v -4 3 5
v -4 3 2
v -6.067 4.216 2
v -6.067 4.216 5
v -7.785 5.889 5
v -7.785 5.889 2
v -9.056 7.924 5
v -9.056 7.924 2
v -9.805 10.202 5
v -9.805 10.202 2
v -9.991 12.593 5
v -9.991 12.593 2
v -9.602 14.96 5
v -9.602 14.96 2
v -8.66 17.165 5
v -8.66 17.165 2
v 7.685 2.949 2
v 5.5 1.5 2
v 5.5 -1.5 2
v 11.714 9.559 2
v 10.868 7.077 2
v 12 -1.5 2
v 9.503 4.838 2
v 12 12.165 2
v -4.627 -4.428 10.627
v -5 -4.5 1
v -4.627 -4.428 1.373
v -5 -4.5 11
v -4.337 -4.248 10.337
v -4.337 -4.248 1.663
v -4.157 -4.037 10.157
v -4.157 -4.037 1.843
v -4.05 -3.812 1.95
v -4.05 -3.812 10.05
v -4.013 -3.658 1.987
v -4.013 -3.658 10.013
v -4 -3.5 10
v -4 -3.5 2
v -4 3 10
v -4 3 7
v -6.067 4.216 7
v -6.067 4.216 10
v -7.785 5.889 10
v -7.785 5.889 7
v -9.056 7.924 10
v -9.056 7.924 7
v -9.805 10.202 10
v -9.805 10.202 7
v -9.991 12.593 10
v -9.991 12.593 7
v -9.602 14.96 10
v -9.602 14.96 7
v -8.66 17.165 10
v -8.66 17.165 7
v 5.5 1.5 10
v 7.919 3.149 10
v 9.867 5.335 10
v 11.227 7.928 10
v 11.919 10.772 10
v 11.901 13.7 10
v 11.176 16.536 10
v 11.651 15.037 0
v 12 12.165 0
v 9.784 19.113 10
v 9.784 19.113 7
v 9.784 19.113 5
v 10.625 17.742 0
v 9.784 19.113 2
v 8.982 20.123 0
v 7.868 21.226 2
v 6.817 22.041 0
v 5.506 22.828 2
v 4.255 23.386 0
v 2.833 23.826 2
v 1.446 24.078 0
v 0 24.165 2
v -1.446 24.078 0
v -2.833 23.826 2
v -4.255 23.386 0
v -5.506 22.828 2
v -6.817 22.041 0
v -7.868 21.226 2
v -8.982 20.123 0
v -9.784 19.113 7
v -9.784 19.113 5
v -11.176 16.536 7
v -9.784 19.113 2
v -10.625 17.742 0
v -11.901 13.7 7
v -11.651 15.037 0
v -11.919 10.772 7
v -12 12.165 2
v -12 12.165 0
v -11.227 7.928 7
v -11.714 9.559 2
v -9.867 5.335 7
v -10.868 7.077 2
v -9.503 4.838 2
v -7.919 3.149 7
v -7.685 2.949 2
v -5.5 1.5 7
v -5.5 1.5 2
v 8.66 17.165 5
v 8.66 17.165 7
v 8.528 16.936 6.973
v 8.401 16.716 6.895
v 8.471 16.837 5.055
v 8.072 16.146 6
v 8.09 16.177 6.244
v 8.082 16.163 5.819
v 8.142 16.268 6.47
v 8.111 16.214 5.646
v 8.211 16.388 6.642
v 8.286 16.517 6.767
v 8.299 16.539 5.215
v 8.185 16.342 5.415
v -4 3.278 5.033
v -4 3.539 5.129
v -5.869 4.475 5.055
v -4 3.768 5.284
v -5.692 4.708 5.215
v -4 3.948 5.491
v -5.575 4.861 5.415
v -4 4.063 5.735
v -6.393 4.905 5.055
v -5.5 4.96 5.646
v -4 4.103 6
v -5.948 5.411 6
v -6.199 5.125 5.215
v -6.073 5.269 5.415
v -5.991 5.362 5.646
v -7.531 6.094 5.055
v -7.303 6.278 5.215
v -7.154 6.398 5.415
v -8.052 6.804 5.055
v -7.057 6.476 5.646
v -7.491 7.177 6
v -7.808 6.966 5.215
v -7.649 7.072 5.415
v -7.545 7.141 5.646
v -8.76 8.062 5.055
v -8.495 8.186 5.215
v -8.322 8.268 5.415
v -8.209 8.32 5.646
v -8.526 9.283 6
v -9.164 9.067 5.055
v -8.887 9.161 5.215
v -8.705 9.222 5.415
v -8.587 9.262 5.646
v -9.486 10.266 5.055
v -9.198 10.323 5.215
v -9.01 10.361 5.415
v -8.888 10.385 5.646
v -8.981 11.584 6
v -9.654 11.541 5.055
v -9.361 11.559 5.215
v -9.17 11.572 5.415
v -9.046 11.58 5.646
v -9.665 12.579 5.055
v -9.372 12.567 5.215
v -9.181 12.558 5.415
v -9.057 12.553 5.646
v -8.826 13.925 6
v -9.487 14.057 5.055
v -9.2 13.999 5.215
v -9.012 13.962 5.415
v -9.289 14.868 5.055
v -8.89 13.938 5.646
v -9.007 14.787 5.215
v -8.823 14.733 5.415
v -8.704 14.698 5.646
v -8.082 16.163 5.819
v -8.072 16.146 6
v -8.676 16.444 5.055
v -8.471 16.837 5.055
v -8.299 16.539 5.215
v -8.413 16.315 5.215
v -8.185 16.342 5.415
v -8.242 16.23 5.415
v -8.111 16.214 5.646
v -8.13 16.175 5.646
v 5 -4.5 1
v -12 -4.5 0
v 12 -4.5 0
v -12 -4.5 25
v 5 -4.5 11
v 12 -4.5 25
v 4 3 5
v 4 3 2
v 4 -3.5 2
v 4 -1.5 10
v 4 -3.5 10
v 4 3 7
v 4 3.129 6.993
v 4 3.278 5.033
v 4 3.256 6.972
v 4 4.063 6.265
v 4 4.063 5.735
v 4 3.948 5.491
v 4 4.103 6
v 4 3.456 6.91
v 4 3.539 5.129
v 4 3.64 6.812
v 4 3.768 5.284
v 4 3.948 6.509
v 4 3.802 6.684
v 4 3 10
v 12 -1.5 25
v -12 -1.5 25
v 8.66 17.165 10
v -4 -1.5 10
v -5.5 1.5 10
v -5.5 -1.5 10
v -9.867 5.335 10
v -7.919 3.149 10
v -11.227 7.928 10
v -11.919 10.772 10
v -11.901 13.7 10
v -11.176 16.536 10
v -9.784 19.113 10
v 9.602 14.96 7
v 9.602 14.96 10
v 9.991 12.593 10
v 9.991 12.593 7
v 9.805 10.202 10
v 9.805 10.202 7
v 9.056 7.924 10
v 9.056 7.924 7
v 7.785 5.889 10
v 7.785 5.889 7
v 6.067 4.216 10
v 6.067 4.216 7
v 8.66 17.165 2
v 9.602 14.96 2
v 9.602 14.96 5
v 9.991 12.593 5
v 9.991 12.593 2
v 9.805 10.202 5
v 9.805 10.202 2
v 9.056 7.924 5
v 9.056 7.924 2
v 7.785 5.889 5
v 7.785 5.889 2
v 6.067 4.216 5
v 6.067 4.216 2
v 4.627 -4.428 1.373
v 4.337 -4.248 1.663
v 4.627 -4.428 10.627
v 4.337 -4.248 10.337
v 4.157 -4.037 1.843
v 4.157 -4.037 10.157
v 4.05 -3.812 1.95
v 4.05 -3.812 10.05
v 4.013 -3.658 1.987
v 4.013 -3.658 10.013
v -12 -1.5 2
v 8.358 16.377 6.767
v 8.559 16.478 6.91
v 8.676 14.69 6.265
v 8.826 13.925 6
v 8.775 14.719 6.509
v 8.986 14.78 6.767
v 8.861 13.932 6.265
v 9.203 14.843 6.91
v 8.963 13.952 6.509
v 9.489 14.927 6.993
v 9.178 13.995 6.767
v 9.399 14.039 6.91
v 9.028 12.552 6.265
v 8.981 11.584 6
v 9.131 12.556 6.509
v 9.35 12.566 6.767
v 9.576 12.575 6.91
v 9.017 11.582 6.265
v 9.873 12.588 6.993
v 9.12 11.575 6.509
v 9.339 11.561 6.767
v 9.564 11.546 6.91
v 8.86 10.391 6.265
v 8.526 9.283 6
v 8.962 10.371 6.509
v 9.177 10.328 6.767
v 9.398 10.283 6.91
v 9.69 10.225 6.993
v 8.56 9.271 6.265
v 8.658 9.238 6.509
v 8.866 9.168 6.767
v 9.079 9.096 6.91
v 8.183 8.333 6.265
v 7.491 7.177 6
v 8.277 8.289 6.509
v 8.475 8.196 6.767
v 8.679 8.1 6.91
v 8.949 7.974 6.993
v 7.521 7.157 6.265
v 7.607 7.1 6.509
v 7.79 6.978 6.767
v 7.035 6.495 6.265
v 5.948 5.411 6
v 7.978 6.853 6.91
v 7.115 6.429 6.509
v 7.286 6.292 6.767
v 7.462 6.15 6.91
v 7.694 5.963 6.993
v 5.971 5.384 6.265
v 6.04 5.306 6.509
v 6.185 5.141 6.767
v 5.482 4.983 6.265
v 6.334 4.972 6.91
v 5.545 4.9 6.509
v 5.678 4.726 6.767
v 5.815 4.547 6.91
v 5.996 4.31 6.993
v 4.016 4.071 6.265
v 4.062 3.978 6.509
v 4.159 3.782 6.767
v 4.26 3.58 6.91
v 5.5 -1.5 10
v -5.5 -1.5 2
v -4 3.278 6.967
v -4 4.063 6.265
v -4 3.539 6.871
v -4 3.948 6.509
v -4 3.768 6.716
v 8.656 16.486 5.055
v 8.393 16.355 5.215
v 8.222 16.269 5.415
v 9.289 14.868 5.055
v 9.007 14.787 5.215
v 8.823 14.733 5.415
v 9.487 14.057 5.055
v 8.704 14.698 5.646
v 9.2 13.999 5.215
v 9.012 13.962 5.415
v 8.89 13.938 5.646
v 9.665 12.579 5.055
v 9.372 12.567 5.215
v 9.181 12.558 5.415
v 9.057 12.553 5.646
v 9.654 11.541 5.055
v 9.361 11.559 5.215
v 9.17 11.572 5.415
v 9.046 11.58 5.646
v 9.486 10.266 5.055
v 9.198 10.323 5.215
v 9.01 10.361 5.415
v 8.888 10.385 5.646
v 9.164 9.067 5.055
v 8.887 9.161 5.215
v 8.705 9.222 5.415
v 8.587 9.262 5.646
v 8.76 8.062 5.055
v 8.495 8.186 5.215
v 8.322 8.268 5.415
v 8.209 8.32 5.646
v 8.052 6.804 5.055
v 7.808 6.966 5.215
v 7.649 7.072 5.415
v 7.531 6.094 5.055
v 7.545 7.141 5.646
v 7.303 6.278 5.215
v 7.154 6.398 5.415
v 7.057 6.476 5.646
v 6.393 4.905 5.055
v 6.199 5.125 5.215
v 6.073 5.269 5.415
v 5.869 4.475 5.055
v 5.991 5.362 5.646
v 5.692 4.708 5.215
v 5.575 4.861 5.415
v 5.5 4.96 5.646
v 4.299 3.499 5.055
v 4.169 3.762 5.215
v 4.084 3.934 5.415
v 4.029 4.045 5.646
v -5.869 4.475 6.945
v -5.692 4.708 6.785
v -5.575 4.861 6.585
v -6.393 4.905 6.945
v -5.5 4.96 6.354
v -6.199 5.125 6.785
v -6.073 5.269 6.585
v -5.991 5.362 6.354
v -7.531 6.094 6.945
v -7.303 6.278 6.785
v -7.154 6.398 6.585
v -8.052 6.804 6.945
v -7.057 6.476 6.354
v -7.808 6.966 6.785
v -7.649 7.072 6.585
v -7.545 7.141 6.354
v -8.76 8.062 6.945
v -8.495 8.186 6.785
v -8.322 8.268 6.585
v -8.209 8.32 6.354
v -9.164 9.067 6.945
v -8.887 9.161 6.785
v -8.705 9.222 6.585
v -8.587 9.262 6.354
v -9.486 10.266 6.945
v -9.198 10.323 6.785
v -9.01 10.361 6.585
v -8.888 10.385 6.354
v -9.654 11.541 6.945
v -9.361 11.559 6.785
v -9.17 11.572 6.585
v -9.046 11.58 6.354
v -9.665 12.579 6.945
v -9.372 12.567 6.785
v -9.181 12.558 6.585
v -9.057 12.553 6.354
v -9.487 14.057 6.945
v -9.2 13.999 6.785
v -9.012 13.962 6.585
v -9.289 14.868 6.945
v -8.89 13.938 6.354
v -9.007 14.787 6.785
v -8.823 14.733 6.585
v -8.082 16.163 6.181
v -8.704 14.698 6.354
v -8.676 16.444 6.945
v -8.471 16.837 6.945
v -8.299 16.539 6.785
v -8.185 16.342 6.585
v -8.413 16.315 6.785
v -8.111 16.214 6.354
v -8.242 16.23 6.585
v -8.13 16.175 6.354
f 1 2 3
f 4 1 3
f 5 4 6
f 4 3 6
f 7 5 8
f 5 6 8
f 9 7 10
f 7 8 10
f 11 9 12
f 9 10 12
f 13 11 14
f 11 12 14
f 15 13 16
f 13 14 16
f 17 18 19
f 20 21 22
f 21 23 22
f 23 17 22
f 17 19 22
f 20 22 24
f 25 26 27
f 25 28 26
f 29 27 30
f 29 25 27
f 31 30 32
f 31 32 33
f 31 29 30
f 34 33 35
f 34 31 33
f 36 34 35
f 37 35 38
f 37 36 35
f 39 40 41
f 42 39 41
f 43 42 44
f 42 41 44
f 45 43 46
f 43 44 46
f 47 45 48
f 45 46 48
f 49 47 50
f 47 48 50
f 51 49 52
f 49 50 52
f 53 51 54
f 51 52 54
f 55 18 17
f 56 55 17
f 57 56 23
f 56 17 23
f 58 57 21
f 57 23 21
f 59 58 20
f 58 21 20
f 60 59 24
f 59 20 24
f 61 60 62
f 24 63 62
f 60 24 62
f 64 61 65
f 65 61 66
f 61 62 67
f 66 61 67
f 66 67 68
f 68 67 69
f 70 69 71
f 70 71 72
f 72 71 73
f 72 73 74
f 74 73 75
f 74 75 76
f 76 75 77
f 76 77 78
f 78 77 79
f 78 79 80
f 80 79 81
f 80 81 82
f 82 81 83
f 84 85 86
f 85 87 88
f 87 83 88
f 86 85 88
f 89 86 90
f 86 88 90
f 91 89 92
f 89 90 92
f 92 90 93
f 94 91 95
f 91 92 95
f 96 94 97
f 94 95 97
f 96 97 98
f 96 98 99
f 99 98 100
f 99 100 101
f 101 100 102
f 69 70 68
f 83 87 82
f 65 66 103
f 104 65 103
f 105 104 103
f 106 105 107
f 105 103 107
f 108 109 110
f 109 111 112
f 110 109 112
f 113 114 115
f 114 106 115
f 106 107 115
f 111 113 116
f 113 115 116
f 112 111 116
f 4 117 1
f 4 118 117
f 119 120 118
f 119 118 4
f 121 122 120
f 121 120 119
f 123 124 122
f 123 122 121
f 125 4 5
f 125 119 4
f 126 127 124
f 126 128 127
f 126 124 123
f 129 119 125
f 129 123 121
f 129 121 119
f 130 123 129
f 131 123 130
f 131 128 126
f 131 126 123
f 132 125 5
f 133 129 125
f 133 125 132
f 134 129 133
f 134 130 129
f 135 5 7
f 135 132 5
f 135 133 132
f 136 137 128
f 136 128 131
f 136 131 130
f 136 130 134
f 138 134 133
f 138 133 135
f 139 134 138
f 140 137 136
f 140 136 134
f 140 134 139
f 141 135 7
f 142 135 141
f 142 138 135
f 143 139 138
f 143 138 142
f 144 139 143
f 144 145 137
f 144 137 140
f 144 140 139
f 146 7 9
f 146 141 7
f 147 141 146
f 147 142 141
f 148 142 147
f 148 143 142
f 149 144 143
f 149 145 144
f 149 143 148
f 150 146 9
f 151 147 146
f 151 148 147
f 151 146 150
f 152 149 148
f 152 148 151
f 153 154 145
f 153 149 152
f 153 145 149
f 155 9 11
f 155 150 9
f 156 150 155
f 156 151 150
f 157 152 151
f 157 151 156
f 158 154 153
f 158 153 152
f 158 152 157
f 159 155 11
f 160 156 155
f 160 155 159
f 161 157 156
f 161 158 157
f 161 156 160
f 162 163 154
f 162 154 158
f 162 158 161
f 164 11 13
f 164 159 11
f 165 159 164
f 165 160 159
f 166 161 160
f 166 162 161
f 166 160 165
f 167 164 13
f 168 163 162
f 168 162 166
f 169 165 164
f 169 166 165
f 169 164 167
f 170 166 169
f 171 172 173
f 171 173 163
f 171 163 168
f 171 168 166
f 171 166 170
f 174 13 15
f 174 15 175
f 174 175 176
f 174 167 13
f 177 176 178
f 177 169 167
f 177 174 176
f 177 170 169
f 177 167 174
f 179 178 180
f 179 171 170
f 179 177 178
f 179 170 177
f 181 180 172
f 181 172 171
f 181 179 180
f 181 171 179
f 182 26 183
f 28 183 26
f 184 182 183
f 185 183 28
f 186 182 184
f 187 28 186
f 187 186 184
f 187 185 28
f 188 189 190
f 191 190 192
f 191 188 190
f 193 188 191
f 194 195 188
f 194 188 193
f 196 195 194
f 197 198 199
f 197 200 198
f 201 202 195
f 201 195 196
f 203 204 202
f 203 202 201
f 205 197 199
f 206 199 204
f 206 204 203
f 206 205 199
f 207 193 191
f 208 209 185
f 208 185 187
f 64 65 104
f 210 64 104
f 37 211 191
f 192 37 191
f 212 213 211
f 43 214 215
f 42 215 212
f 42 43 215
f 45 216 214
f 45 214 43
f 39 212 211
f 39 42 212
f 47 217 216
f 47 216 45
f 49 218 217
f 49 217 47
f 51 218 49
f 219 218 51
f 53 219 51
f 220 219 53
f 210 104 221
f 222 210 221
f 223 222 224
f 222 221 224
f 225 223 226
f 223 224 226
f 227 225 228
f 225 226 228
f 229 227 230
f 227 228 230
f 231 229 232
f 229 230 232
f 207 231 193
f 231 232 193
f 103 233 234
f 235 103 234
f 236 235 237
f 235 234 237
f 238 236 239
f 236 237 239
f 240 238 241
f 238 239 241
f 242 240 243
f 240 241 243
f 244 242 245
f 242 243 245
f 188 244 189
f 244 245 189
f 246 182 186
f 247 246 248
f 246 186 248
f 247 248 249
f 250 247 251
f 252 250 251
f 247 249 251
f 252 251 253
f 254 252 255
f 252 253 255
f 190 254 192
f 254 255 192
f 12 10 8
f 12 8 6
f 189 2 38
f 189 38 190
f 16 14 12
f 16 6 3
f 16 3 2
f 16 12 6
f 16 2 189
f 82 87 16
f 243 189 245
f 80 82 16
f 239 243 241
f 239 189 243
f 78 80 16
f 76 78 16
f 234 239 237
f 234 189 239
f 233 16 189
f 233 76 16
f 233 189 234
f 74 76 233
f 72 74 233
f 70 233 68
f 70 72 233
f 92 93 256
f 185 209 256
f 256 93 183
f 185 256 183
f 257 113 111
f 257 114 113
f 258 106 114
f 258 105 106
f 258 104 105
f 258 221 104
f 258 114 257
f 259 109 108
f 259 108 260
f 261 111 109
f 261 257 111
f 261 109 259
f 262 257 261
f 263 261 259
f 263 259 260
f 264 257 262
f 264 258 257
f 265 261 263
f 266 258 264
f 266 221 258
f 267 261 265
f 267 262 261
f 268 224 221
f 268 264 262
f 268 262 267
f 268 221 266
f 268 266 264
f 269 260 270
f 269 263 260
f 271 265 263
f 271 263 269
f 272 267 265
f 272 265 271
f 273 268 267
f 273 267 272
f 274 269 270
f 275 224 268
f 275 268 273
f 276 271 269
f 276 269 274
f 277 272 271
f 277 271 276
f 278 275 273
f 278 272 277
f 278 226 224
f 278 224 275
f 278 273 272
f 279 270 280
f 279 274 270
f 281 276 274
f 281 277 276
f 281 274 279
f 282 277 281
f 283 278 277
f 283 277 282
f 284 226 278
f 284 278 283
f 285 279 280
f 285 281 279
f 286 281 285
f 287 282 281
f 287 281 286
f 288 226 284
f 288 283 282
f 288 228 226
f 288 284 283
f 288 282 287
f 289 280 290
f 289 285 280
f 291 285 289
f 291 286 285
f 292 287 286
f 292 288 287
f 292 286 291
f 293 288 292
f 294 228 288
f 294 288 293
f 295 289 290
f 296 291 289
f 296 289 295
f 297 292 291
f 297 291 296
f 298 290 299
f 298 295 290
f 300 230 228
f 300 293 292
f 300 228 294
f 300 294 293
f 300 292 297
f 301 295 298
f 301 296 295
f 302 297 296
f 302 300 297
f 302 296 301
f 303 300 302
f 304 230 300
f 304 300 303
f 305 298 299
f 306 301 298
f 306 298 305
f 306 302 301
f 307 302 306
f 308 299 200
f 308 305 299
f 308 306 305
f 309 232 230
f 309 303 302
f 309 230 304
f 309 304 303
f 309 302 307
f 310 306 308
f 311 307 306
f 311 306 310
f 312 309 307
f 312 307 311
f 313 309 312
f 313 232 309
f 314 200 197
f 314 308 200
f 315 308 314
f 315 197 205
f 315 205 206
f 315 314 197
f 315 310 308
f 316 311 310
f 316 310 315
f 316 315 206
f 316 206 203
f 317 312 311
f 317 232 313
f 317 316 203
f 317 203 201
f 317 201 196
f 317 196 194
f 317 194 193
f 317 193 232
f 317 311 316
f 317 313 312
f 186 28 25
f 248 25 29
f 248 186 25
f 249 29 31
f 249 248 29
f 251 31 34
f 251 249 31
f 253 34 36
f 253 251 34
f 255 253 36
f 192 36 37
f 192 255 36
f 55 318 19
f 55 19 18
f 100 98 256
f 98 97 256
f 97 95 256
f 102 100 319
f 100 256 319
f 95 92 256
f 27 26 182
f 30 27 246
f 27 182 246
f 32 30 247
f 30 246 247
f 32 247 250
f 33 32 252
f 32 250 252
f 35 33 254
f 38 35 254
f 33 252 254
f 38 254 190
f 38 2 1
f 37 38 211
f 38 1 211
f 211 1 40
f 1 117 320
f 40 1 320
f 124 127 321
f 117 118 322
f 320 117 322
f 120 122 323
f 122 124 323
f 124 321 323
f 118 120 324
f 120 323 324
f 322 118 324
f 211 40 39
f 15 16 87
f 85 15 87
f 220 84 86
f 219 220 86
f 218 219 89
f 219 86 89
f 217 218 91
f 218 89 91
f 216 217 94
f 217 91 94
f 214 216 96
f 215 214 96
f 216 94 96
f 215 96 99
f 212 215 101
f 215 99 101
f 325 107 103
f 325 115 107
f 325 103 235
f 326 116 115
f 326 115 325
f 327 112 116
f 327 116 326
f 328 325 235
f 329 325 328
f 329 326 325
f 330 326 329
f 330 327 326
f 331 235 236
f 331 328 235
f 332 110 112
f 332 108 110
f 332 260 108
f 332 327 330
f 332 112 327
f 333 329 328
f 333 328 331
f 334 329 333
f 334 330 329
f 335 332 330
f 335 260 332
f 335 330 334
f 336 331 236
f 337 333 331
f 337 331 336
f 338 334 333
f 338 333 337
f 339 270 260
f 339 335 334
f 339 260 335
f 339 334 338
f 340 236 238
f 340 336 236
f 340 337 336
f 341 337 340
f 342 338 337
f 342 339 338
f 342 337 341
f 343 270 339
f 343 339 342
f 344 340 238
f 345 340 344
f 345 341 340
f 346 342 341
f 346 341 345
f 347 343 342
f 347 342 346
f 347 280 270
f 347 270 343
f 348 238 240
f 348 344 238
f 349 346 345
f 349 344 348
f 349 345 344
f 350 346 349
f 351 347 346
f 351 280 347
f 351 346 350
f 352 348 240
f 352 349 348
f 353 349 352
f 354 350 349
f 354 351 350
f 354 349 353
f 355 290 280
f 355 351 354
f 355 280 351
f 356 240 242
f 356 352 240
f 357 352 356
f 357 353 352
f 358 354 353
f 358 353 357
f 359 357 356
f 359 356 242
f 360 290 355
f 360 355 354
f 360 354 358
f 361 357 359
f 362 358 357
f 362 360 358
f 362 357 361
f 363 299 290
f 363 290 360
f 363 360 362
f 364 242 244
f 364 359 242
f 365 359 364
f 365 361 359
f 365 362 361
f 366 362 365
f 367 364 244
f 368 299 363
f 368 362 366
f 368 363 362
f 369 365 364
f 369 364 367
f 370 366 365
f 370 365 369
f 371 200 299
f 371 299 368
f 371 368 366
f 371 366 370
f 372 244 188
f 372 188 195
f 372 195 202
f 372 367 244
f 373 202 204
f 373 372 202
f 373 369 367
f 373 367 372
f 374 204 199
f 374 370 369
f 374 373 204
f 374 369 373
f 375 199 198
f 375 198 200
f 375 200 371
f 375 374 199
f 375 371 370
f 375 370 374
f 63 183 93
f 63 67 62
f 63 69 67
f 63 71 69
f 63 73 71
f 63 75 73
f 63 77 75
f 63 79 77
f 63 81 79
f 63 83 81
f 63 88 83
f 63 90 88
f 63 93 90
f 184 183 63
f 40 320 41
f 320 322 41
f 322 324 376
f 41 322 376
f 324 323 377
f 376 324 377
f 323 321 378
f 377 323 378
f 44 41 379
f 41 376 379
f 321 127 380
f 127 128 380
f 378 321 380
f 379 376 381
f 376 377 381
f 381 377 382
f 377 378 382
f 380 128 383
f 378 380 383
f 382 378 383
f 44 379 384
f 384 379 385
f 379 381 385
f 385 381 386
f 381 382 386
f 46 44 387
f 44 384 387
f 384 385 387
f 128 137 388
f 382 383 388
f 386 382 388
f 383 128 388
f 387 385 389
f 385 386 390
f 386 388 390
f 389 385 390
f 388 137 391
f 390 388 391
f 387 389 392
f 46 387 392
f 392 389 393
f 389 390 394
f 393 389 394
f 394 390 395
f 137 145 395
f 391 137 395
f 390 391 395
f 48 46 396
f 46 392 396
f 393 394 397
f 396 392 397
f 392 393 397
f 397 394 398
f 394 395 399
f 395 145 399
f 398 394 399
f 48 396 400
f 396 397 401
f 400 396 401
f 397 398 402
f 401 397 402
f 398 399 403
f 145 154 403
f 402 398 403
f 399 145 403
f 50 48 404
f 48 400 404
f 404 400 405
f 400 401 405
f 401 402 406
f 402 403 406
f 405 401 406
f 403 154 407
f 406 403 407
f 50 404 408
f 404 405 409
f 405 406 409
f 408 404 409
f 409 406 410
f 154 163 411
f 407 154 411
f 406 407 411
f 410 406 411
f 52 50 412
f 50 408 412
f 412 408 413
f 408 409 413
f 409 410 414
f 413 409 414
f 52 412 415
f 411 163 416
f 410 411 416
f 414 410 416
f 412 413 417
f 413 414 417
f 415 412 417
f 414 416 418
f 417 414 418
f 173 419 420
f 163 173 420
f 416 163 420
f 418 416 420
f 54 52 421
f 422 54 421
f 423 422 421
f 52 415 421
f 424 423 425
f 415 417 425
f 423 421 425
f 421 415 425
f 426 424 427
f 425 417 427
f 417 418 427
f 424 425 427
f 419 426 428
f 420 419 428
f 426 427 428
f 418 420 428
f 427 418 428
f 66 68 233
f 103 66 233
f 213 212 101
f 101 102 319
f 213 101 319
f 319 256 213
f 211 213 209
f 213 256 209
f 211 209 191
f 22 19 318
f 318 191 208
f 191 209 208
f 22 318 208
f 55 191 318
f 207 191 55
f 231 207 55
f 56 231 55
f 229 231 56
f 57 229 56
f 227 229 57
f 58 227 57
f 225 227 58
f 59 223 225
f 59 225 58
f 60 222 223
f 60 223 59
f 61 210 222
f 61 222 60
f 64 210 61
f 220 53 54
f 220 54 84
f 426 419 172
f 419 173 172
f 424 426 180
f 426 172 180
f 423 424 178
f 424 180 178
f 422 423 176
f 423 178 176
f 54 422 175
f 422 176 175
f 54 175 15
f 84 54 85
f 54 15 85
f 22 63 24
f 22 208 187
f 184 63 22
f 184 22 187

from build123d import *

# Parameters (mm, degrees)
F1_DEPTH  = 2
F3_DEPTH  = 3
F5_DEPTH  = 2
F7_DEPTH  = 3
F8_R      = 0.99999
F9_W      = 24
F9_H      = 22.6653645039
F10_DEPTH = 10
F11_W     = 24
F11_H     = 25
F11_W_2   = 8
F11_H_2   = 8
F12_DEPTH = 3
F13_R     = 1
F14_W     = 24
F14_H     = 13.6653645039
F15_DEPTH = 2


# Not quite as in the source:
# - a fillet or chamfer is up to 0.001 mm smaller than in the source, because OpenCascade refuses the exact size


with BuildPart() as f1:
    # F0 (on Top) → F1 (new body)
    with BuildSketch(Plane.XY):
        with BuildLine():
            ThreePointArc((5.5, 1.5), (0, 24.1653645039), (-5.5, 1.5))
            Line((-5.5, 1.5), (-5.5, -1.5))
            ThreePointArc((-5.5, -1.5), (0, -24.1653645039), (5.5, -1.5))
            Line((5.5, -1.5), (5.5, 1.5))
        make_face()
    extrude(amount=F1_DEPTH)

    # F2 (on face) → F3 (join)
    with BuildSketch(Plane.XY.offset(2)):
        with BuildLine():
            Line((9.7844830762, 19.1125863177), (8.6602540378, 17.1653645039))
            ThreePointArc((8.6602540378, 17.1653645039), (9.4991255677, 9.0402063559), (4, 3.0002131139))
            Line((4, 3.0002131139), (4, -6.2432010007))
            Line((4, -6.2432010007), (9.1651513899, -16.1653645039))
            ThreePointArc((9.1651513899, -16.1653645039), (9.5868378212, -9.3206253964), (5.5, -3.8137179596))
            Line((5.5, -3.8137179596), (5.5, 1.5))
            ThreePointArc((5.5, 1.5), (11.6599594736, 9.3289327537), (9.7844830762, 19.1125863177))
        make_face()
        with BuildLine():
            ThreePointArc((-4, 3.0002131139), (-9.4991255677, 9.0402063559), (-8.6602540378, 17.1653645039))
            Line((-8.6602540378, 17.1653645039), (-9.7844830762, 19.1125863177))
            ThreePointArc((-9.7844830762, 19.1125863177), (-11.6599594736, 9.3289327537), (-5.5, 1.5))
            Line((-5.5, 1.5), (-5.5, -3.8137179596))
            ThreePointArc((-5.5, -3.8137179596), (-9.5868378212, -9.3206253964), (-9.1651513899, -16.1653645039))
            Line((-9.1651513899, -16.1653645039), (-4, -6.2432010007))
            Line((-4, -6.2432010007), (-4, 3.0002131139))
        make_face()
    extrude(amount=F3_DEPTH)

    # F4 (on face) → F5 (join)
    with BuildSketch(Plane.XY.offset(5)):
        with BuildLine():
            Line((-8.0717844057, 16.1461052023), (-9.7844830762, 19.1125863177))
            ThreePointArc((-9.7844830762, 19.1125863177), (-11.6599594736, 9.3289327537), (-5.5, 1.5))
            Line((-5.5, 1.5), (-5.5, -5.0414610795))
            ThreePointArc((-5.5, -5.0414610795), (-8.6043935433, -9.5263473097), (-8.5483759414, -14.980549891))
            Line((-8.5483759414, -14.980549891), (-4, -6.2432010007))
            Line((-4, -6.2432010007), (-4, 4.1031067556))
            ThreePointArc((-4, 4.1031067556), (-8.5258693153, 9.2827350759), (-8.0717844057, 16.1461052023))
        make_face()
        with BuildLine():
            ThreePointArc((5.5, 1.5), (11.6599594736, 9.3289327537), (9.7844830762, 19.1125863177))
            Line((9.7844830762, 19.1125863177), (8.0717844057, 16.1461052023))
            ThreePointArc((8.0717844057, 16.1461052023), (8.5258693153, 9.2827350759), (4, 4.1031067556))
            Line((4, 4.1031067556), (4, -6.2432010007))
            Line((4, -6.2432010007), (8.5483759414, -14.980549891))
            ThreePointArc((8.5483759414, -14.980549891), (8.6043935433, -9.5263473097), (5.5, -5.0414610795))
            Line((5.5, -5.0414610795), (5.5, 1.5))
        make_face()
    extrude(amount=F5_DEPTH)

    # F6 (on face) → F7 (join)
    with BuildSketch(Plane.XY.offset(7)):
        with BuildLine():
            Line((9.7844830762, 19.1125863177), (8.6602540378, 17.1653645039))
            ThreePointArc((8.6602540378, 17.1653645039), (9.4991255677, 9.0402063559), (4, 3.0002131139))
            Line((4, 3.0002131139), (4, -6.2432010007))
            Line((4, -6.2432010007), (9.1651513899, -16.1653645039))
            ThreePointArc((9.1651513899, -16.1653645039), (9.5868378212, -9.3206253964), (5.5, -3.8137179596))
            Line((5.5, -3.8137179596), (5.5, 1.5))
            ThreePointArc((5.5, 1.5), (11.6599594736, 9.3289327537), (9.7844830762, 19.1125863177))
        make_face()
        with BuildLine():
            ThreePointArc((-4, 3.0002131139), (-9.4991255677, 9.0402063559), (-8.6602540378, 17.1653645039))
            Line((-8.6602540378, 17.1653645039), (-9.7844830762, 19.1125863177))
            ThreePointArc((-9.7844830762, 19.1125863177), (-11.6599594736, 9.3289327537), (-5.5, 1.5))
            Line((-5.5, 1.5), (-5.5, -3.8137179596))
            ThreePointArc((-5.5, -3.8137179596), (-9.5868378212, -9.3206253964), (-9.1651513899, -16.1653645039))
            Line((-9.1651513899, -16.1653645039), (-4, -6.2432010007))
            Line((-4, -6.2432010007), (-4, 3.0002131139))
        make_face()
    extrude(amount=F7_DEPTH)

    # F8 (radius 1 in the source; OpenCascade refuses exactly that, so slightly less here)
    f8_edges = [f1.edges().sort_by_distance(p)[0] for p in [
        (8.525869, 9.282735, 7),
        (-8.525869, 9.282735, 7),
        (-8.525869, 9.282735, 5),
        (8.525869, 9.282735, 5),
        (-8.604394, -9.526347, 5),
        (-8.604394, -9.526347, 7),
        (8.604394, -9.526347, 7),
        (8.604394, -9.526347, 5),
    ]]
    fillet(f8_edges, radius=F8_R)

    # F9 (on face) → F10 (cut)
    with BuildSketch(Plane.XY.offset(10)):
        with Locations((0, -12.8326822519)):
            Rectangle(F9_W, F9_H)
    extrude(amount=-F10_DEPTH, mode=Mode.SUBTRACT)

    # F11 (on face) → F12 (join)
    with BuildSketch(Plane.XZ.offset(1.5)):
        with Locations((0, 12.5)):
            Rectangle(F11_W, F11_H)
        with Locations((0, 6)):
            Rectangle(F11_W_2, F11_H_2, mode=Mode.SUBTRACT)
    extrude(amount=F12_DEPTH)

    # F13
    f13_edges = [f1.edges().sort_by_distance(p)[0] for p in [
        (0, -4.5, 10),
        (4, -4.5, 6),
        (0, -4.5, 2),
        (-4, -4.5, 6),
    ]]
    fillet(f13_edges, radius=F13_R)

    # F14 (on face) → F15 (join)
    with BuildSketch(Plane(origin=(0, 0, 0), x_dir=(1, 0, 0), z_dir=(0, 0, -1))):
        with Locations((0, -5.3326822519)):
            Rectangle(F14_W, F14_H)
    extrude(amount=-F15_DEPTH)


solid = f1.part
